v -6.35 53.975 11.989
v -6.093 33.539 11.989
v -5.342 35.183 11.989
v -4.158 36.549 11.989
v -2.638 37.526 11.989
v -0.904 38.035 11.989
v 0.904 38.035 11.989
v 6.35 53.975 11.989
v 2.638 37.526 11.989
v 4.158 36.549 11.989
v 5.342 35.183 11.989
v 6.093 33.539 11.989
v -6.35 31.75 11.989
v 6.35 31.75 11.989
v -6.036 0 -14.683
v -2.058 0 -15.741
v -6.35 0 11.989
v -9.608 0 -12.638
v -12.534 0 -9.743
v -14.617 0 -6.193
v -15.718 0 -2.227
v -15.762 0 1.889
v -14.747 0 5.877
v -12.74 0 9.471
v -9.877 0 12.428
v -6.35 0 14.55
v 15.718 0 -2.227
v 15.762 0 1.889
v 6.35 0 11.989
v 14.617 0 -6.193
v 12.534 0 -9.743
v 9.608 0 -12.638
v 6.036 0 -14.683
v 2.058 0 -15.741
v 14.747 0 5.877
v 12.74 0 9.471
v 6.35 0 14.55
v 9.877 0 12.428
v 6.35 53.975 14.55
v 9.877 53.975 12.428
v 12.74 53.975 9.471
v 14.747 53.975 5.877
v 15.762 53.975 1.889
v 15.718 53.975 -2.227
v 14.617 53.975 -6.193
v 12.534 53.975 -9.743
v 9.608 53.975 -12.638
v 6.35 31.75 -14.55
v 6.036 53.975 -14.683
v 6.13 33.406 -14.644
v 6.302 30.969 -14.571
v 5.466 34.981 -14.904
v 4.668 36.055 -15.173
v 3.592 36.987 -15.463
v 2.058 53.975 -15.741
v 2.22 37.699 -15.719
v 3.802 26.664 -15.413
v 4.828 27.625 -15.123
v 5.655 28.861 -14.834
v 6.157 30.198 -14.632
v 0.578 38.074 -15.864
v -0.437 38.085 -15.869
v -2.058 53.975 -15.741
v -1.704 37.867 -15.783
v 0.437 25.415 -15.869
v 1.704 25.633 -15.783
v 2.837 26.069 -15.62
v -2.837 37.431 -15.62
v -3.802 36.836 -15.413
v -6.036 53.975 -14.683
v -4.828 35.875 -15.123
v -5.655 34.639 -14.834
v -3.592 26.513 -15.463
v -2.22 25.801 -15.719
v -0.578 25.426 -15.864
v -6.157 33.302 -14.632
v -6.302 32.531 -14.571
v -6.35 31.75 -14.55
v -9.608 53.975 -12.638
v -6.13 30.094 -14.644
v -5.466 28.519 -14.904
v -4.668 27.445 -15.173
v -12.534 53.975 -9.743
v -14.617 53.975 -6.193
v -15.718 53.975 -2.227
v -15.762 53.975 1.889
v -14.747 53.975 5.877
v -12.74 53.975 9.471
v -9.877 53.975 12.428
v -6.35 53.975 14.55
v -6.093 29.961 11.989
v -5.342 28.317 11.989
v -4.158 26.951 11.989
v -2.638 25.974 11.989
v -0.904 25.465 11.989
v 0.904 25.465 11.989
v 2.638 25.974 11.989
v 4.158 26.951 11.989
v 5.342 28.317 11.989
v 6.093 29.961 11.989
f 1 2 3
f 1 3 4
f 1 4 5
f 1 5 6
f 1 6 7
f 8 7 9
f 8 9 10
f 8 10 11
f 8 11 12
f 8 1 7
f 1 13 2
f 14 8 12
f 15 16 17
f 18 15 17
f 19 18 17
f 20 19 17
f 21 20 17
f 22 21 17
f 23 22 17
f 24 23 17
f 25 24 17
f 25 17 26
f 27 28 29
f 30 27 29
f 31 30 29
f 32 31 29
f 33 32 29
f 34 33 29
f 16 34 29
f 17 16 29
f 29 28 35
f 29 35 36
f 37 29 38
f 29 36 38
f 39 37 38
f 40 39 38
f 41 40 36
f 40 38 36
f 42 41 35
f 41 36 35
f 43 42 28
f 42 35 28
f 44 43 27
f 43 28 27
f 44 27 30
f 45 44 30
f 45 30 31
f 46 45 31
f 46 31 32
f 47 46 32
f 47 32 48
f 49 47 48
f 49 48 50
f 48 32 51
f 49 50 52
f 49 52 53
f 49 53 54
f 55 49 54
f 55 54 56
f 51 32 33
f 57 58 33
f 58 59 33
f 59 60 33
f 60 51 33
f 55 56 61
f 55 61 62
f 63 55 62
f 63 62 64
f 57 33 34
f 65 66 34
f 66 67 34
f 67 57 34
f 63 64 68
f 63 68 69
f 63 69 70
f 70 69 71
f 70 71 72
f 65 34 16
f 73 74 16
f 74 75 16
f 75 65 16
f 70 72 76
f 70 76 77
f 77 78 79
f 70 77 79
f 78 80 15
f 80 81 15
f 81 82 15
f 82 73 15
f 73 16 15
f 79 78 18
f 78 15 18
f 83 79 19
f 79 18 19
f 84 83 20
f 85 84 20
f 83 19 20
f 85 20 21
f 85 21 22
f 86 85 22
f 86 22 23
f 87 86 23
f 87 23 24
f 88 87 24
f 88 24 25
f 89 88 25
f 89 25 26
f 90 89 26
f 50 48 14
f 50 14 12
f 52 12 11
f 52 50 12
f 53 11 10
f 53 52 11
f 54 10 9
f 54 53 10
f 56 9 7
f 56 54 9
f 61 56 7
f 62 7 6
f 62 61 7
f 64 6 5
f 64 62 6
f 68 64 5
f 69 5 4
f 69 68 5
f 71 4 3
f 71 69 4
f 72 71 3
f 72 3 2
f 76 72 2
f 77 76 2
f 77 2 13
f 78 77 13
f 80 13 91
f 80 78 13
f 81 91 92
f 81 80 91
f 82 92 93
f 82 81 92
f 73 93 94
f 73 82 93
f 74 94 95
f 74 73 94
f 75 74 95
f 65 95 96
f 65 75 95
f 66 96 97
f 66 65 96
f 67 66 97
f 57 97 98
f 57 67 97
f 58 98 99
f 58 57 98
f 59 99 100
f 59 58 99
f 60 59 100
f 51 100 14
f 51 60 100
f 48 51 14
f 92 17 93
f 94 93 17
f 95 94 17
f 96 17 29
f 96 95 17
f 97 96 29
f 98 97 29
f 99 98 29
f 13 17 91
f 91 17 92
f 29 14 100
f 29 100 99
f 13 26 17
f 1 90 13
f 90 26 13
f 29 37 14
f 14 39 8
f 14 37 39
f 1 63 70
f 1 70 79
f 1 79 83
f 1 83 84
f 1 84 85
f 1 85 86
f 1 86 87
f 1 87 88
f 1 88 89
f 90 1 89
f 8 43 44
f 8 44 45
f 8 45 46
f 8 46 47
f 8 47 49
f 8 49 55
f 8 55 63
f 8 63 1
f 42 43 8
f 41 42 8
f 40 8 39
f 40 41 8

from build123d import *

# Parameters (mm, degrees)
SKETCH1_R           = 15.875
CYLINDER_DEPTH      = 53.975
SKETCH2_W           = 12.7
SKETCH2_H           = 3.8862
FLUE_TRACK_DEPTH    = 76.2
AIR_DUCT_DEPTH      = 59.45794963
AIR_DUCT_DEPTH_BACK = 59.45794963
SKETCH3_R           = 6.35


with BuildPart() as part:
    # Sketch1 → cylinder (new body)
    with BuildSketch(Plane(origin=(0, 0, 0), x_dir=(1, 0, 0), z_dir=(0, 1, 0))):
        with Locations(Location((0, 0, 0), (0, 0, 270))):
            Circle(SKETCH1_R)
    extrude(amount=CYLINDER_DEPTH)

    # Sketch2 → flue track (cut)
    with BuildSketch(Plane(origin=(0, 53.975, 0), x_dir=(1, 0, 0), z_dir=(0, 1, 0))):
        with Locations((0, -13.9319)):
            Rectangle(SKETCH2_W, SKETCH2_H)
    extrude(amount=-FLUE_TRACK_DEPTH, mode=Mode.SUBTRACT)

    # Sketch3 → air duct (cut, two sides: drawn at the far end of the back side and taken through both)
    with BuildSketch(Plane.XY.offset(-AIR_DUCT_DEPTH_BACK)):
        with Locations((0, 31.75)):
            Circle(SKETCH3_R)
    extrude(amount=AIR_DUCT_DEPTH + AIR_DUCT_DEPTH_BACK, mode=Mode.SUBTRACT)


solid = part.part
